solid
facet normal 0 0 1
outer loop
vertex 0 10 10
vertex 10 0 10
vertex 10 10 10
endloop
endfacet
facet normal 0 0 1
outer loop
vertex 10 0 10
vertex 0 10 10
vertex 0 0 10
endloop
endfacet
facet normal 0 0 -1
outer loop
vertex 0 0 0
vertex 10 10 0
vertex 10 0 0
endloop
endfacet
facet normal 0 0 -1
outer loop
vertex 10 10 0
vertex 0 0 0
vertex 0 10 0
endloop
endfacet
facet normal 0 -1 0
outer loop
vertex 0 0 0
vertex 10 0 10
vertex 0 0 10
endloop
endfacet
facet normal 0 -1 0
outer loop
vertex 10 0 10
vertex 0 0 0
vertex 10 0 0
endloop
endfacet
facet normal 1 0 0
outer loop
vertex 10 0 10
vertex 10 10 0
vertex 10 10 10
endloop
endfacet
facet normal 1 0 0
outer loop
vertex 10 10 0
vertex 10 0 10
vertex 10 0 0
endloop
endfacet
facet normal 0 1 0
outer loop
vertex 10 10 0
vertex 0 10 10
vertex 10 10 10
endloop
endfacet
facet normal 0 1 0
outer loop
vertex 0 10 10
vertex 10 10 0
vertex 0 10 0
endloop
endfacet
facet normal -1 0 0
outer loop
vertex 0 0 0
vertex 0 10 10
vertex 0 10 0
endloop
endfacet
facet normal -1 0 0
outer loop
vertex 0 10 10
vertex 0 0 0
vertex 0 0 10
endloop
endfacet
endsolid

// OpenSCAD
// A 2D and a 3D object at top level. Measured against openscad 2026.08.07: it
// does NOT refuse the export — it writes the 3D object (12 triangles) and drops
// the 2D one silently. We keep the square as a flat part, so this case agrees on
// both legs and the divergence in what happens to the 2D object is invisible to
// both. Kept, and said out loud in the README, rather than deleted.
cube([10, 10, 10]);
translate([20, 0, 0]) square([5, 5]);
